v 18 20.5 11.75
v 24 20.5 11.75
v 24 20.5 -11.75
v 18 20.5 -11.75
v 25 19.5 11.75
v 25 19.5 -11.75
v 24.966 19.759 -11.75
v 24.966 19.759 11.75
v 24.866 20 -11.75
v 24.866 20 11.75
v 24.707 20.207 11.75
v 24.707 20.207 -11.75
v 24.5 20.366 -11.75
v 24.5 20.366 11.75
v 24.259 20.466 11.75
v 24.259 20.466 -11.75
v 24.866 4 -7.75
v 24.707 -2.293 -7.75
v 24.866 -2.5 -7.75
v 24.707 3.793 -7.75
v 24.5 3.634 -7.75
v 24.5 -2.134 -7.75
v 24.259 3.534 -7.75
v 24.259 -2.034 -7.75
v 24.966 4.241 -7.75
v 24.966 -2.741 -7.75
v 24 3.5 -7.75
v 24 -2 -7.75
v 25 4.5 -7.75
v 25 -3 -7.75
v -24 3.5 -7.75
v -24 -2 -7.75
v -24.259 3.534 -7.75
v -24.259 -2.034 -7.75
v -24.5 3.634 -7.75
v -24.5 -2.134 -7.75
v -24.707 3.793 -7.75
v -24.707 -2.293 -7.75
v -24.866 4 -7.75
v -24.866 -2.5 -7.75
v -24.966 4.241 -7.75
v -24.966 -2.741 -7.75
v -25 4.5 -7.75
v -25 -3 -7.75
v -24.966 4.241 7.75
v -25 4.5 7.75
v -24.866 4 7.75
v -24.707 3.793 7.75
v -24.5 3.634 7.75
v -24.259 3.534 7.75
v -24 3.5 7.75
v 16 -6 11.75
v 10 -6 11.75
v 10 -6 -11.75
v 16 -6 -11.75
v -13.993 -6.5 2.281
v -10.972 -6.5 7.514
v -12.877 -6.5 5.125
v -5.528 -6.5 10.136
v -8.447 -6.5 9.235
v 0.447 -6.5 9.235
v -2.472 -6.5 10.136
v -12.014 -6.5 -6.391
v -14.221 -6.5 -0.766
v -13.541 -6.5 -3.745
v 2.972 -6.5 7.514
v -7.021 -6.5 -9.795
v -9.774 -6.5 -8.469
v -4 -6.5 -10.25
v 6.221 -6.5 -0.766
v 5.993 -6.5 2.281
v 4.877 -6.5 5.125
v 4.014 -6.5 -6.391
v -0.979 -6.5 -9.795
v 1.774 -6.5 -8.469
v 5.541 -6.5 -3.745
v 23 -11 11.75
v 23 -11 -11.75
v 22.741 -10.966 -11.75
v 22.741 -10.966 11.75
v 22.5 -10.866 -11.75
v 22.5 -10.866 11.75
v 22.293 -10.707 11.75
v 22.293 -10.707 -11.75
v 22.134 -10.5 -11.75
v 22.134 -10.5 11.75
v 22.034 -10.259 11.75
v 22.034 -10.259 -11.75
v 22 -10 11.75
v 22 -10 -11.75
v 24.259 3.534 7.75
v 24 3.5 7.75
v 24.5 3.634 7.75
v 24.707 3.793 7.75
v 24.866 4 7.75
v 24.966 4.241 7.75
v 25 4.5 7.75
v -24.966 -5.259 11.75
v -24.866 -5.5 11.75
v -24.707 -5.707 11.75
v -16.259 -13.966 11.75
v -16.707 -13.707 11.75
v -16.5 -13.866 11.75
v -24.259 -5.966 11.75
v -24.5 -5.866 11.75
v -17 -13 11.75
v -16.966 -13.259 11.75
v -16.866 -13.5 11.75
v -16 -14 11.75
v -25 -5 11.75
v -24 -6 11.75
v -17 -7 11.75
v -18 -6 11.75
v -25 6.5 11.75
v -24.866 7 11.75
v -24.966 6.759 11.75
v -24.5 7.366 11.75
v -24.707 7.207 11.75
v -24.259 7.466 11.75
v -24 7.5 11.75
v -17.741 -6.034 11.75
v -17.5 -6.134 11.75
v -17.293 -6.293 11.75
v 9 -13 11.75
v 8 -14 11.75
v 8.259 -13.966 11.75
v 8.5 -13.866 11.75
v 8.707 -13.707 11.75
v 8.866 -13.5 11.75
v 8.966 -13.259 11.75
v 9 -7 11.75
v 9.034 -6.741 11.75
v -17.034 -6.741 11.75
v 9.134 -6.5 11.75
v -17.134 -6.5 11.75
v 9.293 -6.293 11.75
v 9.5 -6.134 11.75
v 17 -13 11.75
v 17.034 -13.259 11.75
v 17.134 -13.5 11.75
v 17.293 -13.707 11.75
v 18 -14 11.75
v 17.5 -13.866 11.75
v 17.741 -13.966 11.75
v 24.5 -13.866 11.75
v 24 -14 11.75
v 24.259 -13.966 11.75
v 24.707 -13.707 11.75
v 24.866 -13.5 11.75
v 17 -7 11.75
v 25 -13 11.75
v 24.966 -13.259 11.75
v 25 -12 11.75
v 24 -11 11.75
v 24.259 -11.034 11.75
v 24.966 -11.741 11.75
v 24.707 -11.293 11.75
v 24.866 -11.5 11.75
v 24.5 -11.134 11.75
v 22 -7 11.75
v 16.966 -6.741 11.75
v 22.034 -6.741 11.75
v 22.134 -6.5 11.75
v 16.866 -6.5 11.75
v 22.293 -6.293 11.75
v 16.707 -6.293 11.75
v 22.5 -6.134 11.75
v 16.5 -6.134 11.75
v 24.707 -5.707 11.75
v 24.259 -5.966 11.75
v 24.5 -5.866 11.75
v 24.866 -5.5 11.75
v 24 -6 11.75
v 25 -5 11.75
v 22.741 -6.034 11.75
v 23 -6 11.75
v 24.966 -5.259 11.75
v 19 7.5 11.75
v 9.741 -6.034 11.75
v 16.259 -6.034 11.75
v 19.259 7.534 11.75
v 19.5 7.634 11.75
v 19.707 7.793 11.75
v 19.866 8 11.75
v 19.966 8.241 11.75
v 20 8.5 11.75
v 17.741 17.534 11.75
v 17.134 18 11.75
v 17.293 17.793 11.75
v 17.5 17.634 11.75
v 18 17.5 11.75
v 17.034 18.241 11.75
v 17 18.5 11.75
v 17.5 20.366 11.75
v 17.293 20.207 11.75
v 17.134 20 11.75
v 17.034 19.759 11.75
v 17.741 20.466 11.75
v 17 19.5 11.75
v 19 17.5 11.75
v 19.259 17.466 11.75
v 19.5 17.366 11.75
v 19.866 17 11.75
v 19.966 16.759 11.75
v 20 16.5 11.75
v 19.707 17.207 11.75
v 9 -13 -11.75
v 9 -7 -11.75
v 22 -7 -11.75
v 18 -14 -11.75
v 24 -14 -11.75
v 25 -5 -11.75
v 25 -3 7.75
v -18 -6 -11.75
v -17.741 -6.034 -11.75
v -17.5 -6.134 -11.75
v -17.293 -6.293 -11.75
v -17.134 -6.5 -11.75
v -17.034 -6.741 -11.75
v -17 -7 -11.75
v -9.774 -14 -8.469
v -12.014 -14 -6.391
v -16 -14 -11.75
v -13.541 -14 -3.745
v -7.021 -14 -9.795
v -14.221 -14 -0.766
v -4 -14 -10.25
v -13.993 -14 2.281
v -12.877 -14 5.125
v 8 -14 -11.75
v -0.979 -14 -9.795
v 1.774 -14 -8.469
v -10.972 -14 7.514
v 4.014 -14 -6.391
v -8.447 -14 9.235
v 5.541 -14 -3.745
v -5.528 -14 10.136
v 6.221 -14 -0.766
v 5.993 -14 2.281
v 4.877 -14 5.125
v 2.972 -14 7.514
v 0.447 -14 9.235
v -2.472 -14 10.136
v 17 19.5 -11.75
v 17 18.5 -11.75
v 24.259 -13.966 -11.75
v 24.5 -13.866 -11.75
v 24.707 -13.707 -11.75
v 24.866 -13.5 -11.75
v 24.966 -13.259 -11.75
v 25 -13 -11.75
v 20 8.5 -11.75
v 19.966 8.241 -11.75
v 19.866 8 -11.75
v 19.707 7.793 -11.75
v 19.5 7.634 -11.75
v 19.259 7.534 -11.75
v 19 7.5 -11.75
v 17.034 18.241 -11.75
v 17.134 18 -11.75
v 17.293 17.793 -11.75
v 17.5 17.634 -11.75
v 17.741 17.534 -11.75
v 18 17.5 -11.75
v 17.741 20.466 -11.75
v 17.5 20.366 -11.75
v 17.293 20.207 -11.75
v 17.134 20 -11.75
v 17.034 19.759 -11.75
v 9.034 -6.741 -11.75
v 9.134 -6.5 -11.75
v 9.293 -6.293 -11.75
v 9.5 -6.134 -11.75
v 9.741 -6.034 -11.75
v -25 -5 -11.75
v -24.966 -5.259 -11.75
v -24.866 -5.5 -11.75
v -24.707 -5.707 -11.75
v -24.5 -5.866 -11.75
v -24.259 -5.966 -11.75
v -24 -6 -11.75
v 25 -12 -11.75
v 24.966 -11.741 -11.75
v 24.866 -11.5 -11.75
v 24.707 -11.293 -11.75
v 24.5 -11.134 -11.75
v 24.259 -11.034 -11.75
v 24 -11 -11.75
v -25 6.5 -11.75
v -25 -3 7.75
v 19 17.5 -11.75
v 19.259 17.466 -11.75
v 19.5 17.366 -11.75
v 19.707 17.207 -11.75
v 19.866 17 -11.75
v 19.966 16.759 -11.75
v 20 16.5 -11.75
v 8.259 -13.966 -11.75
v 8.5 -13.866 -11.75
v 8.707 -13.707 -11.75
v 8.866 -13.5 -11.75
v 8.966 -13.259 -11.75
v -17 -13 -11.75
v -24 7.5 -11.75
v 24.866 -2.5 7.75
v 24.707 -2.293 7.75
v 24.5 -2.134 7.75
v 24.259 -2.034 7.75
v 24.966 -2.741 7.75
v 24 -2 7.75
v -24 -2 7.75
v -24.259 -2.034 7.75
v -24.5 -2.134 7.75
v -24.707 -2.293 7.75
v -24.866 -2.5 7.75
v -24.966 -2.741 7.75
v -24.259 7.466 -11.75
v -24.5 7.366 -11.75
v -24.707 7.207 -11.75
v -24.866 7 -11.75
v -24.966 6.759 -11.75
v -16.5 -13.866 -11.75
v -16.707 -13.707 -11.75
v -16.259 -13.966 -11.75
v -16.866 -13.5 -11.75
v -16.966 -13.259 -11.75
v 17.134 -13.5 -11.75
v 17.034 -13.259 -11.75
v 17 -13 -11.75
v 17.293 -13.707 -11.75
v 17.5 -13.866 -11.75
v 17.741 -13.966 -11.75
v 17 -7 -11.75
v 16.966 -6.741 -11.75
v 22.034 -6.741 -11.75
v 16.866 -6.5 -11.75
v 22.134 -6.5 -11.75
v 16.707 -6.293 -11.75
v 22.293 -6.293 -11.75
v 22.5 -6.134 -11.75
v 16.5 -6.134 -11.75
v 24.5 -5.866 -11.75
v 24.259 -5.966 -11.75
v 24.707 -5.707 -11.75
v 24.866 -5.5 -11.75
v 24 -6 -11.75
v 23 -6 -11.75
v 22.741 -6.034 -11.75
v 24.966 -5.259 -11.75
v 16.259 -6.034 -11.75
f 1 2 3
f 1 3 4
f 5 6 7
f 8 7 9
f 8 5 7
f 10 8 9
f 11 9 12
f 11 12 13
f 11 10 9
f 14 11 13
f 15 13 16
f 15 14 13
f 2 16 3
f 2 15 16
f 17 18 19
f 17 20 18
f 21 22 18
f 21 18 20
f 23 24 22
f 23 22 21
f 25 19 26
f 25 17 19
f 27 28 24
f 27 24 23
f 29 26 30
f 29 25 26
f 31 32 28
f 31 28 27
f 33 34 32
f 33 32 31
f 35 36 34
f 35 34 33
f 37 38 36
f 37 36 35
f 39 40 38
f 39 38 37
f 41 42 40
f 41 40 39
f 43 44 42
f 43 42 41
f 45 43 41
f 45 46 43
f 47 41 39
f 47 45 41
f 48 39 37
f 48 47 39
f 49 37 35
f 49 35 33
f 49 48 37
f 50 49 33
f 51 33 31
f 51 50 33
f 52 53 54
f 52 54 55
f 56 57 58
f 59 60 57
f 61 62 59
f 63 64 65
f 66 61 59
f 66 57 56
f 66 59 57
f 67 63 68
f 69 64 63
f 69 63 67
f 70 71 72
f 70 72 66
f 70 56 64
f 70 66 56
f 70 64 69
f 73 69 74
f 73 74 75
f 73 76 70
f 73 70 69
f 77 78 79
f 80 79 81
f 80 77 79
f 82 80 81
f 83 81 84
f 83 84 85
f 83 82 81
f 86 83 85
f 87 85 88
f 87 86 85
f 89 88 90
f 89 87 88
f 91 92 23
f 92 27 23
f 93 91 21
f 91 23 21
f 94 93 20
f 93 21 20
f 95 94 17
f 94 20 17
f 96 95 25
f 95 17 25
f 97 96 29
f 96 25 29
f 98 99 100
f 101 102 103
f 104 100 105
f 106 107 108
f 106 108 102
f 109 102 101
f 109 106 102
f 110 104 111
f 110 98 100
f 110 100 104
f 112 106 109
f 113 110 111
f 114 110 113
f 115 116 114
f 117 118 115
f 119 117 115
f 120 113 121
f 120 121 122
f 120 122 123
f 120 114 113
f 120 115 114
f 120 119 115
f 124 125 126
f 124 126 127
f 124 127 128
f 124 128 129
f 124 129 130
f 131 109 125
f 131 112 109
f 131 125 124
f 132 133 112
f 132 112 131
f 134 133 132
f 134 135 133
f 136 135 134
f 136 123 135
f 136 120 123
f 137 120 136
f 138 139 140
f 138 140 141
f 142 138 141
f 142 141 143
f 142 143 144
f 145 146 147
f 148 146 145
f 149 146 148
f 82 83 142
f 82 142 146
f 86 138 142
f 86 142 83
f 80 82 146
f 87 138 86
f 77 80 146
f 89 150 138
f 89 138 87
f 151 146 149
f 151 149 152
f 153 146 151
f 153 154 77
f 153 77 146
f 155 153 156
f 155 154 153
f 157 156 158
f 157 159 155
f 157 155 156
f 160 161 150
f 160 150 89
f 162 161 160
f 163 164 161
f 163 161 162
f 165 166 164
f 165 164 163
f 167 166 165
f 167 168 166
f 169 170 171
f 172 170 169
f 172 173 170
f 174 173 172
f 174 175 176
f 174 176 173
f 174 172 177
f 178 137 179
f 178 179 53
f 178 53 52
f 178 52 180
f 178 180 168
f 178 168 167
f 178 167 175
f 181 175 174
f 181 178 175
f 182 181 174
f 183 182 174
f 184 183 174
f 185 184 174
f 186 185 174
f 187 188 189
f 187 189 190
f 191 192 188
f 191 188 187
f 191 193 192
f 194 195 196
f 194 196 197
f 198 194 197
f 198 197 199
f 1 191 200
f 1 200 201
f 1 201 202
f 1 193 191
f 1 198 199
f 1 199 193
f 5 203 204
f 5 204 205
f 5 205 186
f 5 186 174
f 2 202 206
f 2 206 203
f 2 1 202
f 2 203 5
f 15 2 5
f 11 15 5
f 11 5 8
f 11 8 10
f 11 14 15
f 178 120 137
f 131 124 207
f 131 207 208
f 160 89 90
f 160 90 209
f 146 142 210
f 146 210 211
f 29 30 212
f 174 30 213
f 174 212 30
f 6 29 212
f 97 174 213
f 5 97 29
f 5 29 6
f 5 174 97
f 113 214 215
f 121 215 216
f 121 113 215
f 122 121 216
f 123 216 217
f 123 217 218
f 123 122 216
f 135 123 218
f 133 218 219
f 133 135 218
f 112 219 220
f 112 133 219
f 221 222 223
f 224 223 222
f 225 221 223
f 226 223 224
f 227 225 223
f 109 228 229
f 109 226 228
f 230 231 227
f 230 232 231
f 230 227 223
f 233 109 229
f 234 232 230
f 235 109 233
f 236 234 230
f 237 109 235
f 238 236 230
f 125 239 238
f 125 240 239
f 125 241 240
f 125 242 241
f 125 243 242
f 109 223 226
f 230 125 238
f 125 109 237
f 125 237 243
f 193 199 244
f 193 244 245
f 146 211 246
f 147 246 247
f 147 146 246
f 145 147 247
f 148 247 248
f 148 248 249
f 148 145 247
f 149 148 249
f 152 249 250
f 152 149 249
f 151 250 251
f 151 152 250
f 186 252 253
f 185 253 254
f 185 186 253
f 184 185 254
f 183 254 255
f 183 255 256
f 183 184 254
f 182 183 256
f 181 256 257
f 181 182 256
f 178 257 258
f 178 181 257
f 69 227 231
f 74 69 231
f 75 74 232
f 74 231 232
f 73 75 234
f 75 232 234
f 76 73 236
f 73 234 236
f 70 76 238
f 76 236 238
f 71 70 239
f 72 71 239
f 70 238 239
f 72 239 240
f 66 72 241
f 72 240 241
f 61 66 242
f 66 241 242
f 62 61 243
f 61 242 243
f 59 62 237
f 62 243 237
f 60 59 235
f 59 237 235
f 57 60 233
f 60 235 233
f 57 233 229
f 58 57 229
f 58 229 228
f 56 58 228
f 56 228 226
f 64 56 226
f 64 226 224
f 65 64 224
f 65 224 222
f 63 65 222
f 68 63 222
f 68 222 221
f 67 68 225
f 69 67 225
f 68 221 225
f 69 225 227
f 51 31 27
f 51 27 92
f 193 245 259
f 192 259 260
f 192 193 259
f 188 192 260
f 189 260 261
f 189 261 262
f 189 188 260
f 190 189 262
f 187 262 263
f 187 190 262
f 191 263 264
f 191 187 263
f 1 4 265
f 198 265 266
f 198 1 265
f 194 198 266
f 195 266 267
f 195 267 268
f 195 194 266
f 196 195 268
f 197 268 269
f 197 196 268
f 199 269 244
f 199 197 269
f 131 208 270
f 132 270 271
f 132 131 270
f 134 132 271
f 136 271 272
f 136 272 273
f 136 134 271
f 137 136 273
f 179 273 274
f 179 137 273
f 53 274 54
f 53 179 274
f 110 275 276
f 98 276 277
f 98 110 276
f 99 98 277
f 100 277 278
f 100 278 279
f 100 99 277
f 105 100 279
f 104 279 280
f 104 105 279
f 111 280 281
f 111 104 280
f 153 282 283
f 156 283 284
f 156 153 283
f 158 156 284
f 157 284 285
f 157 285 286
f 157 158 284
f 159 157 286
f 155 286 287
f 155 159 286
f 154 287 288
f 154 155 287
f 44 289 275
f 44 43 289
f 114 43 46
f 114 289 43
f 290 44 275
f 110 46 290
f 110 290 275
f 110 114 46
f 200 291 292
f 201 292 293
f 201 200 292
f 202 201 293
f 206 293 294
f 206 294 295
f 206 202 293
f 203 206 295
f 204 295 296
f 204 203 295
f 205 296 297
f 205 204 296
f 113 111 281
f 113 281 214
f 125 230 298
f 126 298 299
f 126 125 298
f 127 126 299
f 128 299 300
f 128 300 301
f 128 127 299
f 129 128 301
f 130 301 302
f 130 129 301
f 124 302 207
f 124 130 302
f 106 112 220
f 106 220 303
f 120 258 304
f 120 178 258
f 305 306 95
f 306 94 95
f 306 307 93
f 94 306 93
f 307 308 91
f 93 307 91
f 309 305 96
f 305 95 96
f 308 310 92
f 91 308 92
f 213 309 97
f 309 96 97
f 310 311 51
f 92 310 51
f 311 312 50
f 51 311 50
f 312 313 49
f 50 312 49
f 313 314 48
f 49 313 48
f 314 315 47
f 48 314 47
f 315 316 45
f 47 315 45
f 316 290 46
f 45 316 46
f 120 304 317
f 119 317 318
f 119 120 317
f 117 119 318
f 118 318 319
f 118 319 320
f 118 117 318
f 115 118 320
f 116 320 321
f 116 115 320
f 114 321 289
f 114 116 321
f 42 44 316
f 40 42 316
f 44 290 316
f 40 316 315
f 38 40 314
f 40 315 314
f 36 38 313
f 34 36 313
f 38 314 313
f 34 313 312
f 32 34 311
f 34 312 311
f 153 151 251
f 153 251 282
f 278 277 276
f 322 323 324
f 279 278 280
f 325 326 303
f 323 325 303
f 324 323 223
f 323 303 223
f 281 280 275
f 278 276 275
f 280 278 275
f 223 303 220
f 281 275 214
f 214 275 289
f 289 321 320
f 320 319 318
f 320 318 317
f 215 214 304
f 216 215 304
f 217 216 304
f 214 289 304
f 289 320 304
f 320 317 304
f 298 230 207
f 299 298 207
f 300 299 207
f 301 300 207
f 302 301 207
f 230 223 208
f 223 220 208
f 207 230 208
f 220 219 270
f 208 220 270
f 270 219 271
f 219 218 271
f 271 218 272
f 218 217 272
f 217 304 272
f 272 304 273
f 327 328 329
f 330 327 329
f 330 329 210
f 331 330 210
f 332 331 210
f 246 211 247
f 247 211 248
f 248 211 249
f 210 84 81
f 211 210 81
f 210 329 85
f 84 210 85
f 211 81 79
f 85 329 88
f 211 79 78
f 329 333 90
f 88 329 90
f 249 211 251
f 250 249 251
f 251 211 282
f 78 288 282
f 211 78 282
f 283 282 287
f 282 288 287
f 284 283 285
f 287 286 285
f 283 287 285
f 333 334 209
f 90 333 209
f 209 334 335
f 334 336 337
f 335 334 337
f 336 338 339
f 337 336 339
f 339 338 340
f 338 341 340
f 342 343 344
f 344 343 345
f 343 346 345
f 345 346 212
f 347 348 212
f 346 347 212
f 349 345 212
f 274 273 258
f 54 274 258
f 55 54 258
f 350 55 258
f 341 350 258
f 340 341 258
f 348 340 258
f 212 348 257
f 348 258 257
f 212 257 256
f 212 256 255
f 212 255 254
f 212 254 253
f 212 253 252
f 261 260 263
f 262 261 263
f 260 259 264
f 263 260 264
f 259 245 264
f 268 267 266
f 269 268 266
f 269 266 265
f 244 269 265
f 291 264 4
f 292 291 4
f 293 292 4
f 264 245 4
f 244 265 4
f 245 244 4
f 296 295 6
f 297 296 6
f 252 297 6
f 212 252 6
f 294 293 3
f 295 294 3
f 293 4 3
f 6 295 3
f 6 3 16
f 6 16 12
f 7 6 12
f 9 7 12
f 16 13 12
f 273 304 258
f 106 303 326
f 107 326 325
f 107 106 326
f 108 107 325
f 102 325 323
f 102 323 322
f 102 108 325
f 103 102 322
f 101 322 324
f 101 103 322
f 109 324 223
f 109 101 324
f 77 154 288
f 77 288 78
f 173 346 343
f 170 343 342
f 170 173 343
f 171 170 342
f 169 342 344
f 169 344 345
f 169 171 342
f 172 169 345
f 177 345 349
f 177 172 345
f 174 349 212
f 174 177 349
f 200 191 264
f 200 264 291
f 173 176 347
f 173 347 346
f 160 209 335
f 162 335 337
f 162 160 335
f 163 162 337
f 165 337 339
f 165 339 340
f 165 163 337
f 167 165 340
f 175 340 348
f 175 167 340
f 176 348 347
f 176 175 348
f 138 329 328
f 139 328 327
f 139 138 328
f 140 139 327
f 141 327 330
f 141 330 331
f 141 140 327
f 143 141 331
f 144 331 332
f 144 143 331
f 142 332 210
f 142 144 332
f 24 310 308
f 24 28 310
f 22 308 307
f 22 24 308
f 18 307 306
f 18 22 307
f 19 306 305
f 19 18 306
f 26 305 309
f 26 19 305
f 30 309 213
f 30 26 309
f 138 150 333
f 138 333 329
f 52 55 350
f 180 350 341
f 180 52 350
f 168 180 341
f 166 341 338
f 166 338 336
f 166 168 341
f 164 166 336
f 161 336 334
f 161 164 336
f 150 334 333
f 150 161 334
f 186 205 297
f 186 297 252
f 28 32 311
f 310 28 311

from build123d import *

# Parameters (mm, degrees)
BOSS_EXTRUDE2_DEPTH = 11.75
SKETCH5_W           = 15.5
SKETCH5_H           = 5.5
CUT_EXTRUDE2_DEPTH  = 56.302011717
FILLET1_R           = 1
SKETCH7_R           = 10.25
CUT_EXTRUDE3_DEPTH  = 7.5


with BuildPart() as part:
    # Sketch1 → Boss-Extrude2 (new, symmetric)
    with BuildSketch(Plane.XY):
        with BuildLine():
            Line((-25, 6.5), (-25, -5))
            ThreePointArc((-25, -5), (-24.707106781, -5.707106781), (-24, -6))
            Line((-24, -6), (-18, -6))
            ThreePointArc((-18, -6), (-17.292893219, -6.292893219), (-17, -7))
            Line((-17, -7), (-17, -13))
            ThreePointArc((-17, -13), (-16.707106781, -13.707106781), (-16, -14))
            Line((-16, -14), (-4, -14))
            Line((-4, -14), (8, -14))
            ThreePointArc((8, -14), (8.707106781, -13.707106781), (9, -13))
            Line((9, -13), (9, -7))
            ThreePointArc((9, -7), (9.292893219, -6.292893219), (10, -6))
            Line((10, -6), (16, -6))
            ThreePointArc((16, -6), (16.707106781, -6.292893219), (17, -7))
            Line((17, -7), (17, -11))
            Line((17, -11), (17, -13))
            ThreePointArc((17, -13), (17.292893219, -13.707106781), (18, -14))
            Line((18, -14), (24, -14))
            ThreePointArc((24, -14), (24.707106781, -13.707106781), (25, -13))
            Line((25, -13), (25, -12))
            ThreePointArc((25, -12), (24.707106781, -11.292893219), (24, -11))
            Line((24, -11), (23, -11))
            ThreePointArc((23, -11), (22.292893219, -10.707106781), (22, -10))
            Line((22, -10), (22, -7))
            ThreePointArc((22, -7), (22.292893219, -6.292893219), (23, -6))
            Line((23, -6), (24, -6))
            ThreePointArc((24, -6), (24.707106781, -5.707106781), (25, -5))
            Line((25, -5), (25, 8.5))
            Line((25, 8.5), (25, 16))
            Line((25, 16), (25, 19.5))
            ThreePointArc((25, 19.5), (24.707106781, 20.207106781), (24, 20.5))
            Line((24, 20.5), (18, 20.5))
            ThreePointArc((18, 20.5), (17.292893219, 20.207106781), (17, 19.5))
            Line((17, 19.5), (17, 18.5))
            ThreePointArc((17, 18.5), (17.292893219, 17.792893219), (18, 17.5))
            Line((18, 17.5), (19, 17.5))
            ThreePointArc((19, 17.5), (19.707106781, 17.207106781), (20, 16.5))
            Line((20, 16.5), (20, 8.5))
            ThreePointArc((20, 8.5), (19.707106781, 7.792893219), (19, 7.5))
            Line((19, 7.5), (-24, 7.5))
            ThreePointArc((-24, 7.5), (-24.707106781, 7.207106781), (-25, 6.5))
        make_face()
    extrude(amount=BOSS_EXTRUDE2_DEPTH, both=True)

    # Sketch5 → Cut-Extrude2 (cut, through all)
    with BuildSketch(Plane.ZY.offset(25)):
        with Locations((0, 0.75)):
            Rectangle(SKETCH5_W, SKETCH5_H)
    extrude(amount=-CUT_EXTRUDE2_DEPTH, mode=Mode.SUBTRACT)

    # Fillet1
    fillet1_edges = [part.edges().sort_by_distance(p)[0] for p in [
        (-25, 3.5, 0),
        (25, -2, 0),
        (25, 3.5, 0),
        (-25, -2, 0),
    ]]
    fillet(fillet1_edges, radius=FILLET1_R)

    # Sketch7 → Cut-Extrude3 (cut, symmetric)
    with BuildSketch(Plane.XZ.offset(14)):
        with Locations(Location((-4, 0, 0), (0, 0, 270))):
            Circle(SKETCH7_R)
    extrude(amount=CUT_EXTRUDE3_DEPTH, both=True, mode=Mode.SUBTRACT)


solid = part.part
